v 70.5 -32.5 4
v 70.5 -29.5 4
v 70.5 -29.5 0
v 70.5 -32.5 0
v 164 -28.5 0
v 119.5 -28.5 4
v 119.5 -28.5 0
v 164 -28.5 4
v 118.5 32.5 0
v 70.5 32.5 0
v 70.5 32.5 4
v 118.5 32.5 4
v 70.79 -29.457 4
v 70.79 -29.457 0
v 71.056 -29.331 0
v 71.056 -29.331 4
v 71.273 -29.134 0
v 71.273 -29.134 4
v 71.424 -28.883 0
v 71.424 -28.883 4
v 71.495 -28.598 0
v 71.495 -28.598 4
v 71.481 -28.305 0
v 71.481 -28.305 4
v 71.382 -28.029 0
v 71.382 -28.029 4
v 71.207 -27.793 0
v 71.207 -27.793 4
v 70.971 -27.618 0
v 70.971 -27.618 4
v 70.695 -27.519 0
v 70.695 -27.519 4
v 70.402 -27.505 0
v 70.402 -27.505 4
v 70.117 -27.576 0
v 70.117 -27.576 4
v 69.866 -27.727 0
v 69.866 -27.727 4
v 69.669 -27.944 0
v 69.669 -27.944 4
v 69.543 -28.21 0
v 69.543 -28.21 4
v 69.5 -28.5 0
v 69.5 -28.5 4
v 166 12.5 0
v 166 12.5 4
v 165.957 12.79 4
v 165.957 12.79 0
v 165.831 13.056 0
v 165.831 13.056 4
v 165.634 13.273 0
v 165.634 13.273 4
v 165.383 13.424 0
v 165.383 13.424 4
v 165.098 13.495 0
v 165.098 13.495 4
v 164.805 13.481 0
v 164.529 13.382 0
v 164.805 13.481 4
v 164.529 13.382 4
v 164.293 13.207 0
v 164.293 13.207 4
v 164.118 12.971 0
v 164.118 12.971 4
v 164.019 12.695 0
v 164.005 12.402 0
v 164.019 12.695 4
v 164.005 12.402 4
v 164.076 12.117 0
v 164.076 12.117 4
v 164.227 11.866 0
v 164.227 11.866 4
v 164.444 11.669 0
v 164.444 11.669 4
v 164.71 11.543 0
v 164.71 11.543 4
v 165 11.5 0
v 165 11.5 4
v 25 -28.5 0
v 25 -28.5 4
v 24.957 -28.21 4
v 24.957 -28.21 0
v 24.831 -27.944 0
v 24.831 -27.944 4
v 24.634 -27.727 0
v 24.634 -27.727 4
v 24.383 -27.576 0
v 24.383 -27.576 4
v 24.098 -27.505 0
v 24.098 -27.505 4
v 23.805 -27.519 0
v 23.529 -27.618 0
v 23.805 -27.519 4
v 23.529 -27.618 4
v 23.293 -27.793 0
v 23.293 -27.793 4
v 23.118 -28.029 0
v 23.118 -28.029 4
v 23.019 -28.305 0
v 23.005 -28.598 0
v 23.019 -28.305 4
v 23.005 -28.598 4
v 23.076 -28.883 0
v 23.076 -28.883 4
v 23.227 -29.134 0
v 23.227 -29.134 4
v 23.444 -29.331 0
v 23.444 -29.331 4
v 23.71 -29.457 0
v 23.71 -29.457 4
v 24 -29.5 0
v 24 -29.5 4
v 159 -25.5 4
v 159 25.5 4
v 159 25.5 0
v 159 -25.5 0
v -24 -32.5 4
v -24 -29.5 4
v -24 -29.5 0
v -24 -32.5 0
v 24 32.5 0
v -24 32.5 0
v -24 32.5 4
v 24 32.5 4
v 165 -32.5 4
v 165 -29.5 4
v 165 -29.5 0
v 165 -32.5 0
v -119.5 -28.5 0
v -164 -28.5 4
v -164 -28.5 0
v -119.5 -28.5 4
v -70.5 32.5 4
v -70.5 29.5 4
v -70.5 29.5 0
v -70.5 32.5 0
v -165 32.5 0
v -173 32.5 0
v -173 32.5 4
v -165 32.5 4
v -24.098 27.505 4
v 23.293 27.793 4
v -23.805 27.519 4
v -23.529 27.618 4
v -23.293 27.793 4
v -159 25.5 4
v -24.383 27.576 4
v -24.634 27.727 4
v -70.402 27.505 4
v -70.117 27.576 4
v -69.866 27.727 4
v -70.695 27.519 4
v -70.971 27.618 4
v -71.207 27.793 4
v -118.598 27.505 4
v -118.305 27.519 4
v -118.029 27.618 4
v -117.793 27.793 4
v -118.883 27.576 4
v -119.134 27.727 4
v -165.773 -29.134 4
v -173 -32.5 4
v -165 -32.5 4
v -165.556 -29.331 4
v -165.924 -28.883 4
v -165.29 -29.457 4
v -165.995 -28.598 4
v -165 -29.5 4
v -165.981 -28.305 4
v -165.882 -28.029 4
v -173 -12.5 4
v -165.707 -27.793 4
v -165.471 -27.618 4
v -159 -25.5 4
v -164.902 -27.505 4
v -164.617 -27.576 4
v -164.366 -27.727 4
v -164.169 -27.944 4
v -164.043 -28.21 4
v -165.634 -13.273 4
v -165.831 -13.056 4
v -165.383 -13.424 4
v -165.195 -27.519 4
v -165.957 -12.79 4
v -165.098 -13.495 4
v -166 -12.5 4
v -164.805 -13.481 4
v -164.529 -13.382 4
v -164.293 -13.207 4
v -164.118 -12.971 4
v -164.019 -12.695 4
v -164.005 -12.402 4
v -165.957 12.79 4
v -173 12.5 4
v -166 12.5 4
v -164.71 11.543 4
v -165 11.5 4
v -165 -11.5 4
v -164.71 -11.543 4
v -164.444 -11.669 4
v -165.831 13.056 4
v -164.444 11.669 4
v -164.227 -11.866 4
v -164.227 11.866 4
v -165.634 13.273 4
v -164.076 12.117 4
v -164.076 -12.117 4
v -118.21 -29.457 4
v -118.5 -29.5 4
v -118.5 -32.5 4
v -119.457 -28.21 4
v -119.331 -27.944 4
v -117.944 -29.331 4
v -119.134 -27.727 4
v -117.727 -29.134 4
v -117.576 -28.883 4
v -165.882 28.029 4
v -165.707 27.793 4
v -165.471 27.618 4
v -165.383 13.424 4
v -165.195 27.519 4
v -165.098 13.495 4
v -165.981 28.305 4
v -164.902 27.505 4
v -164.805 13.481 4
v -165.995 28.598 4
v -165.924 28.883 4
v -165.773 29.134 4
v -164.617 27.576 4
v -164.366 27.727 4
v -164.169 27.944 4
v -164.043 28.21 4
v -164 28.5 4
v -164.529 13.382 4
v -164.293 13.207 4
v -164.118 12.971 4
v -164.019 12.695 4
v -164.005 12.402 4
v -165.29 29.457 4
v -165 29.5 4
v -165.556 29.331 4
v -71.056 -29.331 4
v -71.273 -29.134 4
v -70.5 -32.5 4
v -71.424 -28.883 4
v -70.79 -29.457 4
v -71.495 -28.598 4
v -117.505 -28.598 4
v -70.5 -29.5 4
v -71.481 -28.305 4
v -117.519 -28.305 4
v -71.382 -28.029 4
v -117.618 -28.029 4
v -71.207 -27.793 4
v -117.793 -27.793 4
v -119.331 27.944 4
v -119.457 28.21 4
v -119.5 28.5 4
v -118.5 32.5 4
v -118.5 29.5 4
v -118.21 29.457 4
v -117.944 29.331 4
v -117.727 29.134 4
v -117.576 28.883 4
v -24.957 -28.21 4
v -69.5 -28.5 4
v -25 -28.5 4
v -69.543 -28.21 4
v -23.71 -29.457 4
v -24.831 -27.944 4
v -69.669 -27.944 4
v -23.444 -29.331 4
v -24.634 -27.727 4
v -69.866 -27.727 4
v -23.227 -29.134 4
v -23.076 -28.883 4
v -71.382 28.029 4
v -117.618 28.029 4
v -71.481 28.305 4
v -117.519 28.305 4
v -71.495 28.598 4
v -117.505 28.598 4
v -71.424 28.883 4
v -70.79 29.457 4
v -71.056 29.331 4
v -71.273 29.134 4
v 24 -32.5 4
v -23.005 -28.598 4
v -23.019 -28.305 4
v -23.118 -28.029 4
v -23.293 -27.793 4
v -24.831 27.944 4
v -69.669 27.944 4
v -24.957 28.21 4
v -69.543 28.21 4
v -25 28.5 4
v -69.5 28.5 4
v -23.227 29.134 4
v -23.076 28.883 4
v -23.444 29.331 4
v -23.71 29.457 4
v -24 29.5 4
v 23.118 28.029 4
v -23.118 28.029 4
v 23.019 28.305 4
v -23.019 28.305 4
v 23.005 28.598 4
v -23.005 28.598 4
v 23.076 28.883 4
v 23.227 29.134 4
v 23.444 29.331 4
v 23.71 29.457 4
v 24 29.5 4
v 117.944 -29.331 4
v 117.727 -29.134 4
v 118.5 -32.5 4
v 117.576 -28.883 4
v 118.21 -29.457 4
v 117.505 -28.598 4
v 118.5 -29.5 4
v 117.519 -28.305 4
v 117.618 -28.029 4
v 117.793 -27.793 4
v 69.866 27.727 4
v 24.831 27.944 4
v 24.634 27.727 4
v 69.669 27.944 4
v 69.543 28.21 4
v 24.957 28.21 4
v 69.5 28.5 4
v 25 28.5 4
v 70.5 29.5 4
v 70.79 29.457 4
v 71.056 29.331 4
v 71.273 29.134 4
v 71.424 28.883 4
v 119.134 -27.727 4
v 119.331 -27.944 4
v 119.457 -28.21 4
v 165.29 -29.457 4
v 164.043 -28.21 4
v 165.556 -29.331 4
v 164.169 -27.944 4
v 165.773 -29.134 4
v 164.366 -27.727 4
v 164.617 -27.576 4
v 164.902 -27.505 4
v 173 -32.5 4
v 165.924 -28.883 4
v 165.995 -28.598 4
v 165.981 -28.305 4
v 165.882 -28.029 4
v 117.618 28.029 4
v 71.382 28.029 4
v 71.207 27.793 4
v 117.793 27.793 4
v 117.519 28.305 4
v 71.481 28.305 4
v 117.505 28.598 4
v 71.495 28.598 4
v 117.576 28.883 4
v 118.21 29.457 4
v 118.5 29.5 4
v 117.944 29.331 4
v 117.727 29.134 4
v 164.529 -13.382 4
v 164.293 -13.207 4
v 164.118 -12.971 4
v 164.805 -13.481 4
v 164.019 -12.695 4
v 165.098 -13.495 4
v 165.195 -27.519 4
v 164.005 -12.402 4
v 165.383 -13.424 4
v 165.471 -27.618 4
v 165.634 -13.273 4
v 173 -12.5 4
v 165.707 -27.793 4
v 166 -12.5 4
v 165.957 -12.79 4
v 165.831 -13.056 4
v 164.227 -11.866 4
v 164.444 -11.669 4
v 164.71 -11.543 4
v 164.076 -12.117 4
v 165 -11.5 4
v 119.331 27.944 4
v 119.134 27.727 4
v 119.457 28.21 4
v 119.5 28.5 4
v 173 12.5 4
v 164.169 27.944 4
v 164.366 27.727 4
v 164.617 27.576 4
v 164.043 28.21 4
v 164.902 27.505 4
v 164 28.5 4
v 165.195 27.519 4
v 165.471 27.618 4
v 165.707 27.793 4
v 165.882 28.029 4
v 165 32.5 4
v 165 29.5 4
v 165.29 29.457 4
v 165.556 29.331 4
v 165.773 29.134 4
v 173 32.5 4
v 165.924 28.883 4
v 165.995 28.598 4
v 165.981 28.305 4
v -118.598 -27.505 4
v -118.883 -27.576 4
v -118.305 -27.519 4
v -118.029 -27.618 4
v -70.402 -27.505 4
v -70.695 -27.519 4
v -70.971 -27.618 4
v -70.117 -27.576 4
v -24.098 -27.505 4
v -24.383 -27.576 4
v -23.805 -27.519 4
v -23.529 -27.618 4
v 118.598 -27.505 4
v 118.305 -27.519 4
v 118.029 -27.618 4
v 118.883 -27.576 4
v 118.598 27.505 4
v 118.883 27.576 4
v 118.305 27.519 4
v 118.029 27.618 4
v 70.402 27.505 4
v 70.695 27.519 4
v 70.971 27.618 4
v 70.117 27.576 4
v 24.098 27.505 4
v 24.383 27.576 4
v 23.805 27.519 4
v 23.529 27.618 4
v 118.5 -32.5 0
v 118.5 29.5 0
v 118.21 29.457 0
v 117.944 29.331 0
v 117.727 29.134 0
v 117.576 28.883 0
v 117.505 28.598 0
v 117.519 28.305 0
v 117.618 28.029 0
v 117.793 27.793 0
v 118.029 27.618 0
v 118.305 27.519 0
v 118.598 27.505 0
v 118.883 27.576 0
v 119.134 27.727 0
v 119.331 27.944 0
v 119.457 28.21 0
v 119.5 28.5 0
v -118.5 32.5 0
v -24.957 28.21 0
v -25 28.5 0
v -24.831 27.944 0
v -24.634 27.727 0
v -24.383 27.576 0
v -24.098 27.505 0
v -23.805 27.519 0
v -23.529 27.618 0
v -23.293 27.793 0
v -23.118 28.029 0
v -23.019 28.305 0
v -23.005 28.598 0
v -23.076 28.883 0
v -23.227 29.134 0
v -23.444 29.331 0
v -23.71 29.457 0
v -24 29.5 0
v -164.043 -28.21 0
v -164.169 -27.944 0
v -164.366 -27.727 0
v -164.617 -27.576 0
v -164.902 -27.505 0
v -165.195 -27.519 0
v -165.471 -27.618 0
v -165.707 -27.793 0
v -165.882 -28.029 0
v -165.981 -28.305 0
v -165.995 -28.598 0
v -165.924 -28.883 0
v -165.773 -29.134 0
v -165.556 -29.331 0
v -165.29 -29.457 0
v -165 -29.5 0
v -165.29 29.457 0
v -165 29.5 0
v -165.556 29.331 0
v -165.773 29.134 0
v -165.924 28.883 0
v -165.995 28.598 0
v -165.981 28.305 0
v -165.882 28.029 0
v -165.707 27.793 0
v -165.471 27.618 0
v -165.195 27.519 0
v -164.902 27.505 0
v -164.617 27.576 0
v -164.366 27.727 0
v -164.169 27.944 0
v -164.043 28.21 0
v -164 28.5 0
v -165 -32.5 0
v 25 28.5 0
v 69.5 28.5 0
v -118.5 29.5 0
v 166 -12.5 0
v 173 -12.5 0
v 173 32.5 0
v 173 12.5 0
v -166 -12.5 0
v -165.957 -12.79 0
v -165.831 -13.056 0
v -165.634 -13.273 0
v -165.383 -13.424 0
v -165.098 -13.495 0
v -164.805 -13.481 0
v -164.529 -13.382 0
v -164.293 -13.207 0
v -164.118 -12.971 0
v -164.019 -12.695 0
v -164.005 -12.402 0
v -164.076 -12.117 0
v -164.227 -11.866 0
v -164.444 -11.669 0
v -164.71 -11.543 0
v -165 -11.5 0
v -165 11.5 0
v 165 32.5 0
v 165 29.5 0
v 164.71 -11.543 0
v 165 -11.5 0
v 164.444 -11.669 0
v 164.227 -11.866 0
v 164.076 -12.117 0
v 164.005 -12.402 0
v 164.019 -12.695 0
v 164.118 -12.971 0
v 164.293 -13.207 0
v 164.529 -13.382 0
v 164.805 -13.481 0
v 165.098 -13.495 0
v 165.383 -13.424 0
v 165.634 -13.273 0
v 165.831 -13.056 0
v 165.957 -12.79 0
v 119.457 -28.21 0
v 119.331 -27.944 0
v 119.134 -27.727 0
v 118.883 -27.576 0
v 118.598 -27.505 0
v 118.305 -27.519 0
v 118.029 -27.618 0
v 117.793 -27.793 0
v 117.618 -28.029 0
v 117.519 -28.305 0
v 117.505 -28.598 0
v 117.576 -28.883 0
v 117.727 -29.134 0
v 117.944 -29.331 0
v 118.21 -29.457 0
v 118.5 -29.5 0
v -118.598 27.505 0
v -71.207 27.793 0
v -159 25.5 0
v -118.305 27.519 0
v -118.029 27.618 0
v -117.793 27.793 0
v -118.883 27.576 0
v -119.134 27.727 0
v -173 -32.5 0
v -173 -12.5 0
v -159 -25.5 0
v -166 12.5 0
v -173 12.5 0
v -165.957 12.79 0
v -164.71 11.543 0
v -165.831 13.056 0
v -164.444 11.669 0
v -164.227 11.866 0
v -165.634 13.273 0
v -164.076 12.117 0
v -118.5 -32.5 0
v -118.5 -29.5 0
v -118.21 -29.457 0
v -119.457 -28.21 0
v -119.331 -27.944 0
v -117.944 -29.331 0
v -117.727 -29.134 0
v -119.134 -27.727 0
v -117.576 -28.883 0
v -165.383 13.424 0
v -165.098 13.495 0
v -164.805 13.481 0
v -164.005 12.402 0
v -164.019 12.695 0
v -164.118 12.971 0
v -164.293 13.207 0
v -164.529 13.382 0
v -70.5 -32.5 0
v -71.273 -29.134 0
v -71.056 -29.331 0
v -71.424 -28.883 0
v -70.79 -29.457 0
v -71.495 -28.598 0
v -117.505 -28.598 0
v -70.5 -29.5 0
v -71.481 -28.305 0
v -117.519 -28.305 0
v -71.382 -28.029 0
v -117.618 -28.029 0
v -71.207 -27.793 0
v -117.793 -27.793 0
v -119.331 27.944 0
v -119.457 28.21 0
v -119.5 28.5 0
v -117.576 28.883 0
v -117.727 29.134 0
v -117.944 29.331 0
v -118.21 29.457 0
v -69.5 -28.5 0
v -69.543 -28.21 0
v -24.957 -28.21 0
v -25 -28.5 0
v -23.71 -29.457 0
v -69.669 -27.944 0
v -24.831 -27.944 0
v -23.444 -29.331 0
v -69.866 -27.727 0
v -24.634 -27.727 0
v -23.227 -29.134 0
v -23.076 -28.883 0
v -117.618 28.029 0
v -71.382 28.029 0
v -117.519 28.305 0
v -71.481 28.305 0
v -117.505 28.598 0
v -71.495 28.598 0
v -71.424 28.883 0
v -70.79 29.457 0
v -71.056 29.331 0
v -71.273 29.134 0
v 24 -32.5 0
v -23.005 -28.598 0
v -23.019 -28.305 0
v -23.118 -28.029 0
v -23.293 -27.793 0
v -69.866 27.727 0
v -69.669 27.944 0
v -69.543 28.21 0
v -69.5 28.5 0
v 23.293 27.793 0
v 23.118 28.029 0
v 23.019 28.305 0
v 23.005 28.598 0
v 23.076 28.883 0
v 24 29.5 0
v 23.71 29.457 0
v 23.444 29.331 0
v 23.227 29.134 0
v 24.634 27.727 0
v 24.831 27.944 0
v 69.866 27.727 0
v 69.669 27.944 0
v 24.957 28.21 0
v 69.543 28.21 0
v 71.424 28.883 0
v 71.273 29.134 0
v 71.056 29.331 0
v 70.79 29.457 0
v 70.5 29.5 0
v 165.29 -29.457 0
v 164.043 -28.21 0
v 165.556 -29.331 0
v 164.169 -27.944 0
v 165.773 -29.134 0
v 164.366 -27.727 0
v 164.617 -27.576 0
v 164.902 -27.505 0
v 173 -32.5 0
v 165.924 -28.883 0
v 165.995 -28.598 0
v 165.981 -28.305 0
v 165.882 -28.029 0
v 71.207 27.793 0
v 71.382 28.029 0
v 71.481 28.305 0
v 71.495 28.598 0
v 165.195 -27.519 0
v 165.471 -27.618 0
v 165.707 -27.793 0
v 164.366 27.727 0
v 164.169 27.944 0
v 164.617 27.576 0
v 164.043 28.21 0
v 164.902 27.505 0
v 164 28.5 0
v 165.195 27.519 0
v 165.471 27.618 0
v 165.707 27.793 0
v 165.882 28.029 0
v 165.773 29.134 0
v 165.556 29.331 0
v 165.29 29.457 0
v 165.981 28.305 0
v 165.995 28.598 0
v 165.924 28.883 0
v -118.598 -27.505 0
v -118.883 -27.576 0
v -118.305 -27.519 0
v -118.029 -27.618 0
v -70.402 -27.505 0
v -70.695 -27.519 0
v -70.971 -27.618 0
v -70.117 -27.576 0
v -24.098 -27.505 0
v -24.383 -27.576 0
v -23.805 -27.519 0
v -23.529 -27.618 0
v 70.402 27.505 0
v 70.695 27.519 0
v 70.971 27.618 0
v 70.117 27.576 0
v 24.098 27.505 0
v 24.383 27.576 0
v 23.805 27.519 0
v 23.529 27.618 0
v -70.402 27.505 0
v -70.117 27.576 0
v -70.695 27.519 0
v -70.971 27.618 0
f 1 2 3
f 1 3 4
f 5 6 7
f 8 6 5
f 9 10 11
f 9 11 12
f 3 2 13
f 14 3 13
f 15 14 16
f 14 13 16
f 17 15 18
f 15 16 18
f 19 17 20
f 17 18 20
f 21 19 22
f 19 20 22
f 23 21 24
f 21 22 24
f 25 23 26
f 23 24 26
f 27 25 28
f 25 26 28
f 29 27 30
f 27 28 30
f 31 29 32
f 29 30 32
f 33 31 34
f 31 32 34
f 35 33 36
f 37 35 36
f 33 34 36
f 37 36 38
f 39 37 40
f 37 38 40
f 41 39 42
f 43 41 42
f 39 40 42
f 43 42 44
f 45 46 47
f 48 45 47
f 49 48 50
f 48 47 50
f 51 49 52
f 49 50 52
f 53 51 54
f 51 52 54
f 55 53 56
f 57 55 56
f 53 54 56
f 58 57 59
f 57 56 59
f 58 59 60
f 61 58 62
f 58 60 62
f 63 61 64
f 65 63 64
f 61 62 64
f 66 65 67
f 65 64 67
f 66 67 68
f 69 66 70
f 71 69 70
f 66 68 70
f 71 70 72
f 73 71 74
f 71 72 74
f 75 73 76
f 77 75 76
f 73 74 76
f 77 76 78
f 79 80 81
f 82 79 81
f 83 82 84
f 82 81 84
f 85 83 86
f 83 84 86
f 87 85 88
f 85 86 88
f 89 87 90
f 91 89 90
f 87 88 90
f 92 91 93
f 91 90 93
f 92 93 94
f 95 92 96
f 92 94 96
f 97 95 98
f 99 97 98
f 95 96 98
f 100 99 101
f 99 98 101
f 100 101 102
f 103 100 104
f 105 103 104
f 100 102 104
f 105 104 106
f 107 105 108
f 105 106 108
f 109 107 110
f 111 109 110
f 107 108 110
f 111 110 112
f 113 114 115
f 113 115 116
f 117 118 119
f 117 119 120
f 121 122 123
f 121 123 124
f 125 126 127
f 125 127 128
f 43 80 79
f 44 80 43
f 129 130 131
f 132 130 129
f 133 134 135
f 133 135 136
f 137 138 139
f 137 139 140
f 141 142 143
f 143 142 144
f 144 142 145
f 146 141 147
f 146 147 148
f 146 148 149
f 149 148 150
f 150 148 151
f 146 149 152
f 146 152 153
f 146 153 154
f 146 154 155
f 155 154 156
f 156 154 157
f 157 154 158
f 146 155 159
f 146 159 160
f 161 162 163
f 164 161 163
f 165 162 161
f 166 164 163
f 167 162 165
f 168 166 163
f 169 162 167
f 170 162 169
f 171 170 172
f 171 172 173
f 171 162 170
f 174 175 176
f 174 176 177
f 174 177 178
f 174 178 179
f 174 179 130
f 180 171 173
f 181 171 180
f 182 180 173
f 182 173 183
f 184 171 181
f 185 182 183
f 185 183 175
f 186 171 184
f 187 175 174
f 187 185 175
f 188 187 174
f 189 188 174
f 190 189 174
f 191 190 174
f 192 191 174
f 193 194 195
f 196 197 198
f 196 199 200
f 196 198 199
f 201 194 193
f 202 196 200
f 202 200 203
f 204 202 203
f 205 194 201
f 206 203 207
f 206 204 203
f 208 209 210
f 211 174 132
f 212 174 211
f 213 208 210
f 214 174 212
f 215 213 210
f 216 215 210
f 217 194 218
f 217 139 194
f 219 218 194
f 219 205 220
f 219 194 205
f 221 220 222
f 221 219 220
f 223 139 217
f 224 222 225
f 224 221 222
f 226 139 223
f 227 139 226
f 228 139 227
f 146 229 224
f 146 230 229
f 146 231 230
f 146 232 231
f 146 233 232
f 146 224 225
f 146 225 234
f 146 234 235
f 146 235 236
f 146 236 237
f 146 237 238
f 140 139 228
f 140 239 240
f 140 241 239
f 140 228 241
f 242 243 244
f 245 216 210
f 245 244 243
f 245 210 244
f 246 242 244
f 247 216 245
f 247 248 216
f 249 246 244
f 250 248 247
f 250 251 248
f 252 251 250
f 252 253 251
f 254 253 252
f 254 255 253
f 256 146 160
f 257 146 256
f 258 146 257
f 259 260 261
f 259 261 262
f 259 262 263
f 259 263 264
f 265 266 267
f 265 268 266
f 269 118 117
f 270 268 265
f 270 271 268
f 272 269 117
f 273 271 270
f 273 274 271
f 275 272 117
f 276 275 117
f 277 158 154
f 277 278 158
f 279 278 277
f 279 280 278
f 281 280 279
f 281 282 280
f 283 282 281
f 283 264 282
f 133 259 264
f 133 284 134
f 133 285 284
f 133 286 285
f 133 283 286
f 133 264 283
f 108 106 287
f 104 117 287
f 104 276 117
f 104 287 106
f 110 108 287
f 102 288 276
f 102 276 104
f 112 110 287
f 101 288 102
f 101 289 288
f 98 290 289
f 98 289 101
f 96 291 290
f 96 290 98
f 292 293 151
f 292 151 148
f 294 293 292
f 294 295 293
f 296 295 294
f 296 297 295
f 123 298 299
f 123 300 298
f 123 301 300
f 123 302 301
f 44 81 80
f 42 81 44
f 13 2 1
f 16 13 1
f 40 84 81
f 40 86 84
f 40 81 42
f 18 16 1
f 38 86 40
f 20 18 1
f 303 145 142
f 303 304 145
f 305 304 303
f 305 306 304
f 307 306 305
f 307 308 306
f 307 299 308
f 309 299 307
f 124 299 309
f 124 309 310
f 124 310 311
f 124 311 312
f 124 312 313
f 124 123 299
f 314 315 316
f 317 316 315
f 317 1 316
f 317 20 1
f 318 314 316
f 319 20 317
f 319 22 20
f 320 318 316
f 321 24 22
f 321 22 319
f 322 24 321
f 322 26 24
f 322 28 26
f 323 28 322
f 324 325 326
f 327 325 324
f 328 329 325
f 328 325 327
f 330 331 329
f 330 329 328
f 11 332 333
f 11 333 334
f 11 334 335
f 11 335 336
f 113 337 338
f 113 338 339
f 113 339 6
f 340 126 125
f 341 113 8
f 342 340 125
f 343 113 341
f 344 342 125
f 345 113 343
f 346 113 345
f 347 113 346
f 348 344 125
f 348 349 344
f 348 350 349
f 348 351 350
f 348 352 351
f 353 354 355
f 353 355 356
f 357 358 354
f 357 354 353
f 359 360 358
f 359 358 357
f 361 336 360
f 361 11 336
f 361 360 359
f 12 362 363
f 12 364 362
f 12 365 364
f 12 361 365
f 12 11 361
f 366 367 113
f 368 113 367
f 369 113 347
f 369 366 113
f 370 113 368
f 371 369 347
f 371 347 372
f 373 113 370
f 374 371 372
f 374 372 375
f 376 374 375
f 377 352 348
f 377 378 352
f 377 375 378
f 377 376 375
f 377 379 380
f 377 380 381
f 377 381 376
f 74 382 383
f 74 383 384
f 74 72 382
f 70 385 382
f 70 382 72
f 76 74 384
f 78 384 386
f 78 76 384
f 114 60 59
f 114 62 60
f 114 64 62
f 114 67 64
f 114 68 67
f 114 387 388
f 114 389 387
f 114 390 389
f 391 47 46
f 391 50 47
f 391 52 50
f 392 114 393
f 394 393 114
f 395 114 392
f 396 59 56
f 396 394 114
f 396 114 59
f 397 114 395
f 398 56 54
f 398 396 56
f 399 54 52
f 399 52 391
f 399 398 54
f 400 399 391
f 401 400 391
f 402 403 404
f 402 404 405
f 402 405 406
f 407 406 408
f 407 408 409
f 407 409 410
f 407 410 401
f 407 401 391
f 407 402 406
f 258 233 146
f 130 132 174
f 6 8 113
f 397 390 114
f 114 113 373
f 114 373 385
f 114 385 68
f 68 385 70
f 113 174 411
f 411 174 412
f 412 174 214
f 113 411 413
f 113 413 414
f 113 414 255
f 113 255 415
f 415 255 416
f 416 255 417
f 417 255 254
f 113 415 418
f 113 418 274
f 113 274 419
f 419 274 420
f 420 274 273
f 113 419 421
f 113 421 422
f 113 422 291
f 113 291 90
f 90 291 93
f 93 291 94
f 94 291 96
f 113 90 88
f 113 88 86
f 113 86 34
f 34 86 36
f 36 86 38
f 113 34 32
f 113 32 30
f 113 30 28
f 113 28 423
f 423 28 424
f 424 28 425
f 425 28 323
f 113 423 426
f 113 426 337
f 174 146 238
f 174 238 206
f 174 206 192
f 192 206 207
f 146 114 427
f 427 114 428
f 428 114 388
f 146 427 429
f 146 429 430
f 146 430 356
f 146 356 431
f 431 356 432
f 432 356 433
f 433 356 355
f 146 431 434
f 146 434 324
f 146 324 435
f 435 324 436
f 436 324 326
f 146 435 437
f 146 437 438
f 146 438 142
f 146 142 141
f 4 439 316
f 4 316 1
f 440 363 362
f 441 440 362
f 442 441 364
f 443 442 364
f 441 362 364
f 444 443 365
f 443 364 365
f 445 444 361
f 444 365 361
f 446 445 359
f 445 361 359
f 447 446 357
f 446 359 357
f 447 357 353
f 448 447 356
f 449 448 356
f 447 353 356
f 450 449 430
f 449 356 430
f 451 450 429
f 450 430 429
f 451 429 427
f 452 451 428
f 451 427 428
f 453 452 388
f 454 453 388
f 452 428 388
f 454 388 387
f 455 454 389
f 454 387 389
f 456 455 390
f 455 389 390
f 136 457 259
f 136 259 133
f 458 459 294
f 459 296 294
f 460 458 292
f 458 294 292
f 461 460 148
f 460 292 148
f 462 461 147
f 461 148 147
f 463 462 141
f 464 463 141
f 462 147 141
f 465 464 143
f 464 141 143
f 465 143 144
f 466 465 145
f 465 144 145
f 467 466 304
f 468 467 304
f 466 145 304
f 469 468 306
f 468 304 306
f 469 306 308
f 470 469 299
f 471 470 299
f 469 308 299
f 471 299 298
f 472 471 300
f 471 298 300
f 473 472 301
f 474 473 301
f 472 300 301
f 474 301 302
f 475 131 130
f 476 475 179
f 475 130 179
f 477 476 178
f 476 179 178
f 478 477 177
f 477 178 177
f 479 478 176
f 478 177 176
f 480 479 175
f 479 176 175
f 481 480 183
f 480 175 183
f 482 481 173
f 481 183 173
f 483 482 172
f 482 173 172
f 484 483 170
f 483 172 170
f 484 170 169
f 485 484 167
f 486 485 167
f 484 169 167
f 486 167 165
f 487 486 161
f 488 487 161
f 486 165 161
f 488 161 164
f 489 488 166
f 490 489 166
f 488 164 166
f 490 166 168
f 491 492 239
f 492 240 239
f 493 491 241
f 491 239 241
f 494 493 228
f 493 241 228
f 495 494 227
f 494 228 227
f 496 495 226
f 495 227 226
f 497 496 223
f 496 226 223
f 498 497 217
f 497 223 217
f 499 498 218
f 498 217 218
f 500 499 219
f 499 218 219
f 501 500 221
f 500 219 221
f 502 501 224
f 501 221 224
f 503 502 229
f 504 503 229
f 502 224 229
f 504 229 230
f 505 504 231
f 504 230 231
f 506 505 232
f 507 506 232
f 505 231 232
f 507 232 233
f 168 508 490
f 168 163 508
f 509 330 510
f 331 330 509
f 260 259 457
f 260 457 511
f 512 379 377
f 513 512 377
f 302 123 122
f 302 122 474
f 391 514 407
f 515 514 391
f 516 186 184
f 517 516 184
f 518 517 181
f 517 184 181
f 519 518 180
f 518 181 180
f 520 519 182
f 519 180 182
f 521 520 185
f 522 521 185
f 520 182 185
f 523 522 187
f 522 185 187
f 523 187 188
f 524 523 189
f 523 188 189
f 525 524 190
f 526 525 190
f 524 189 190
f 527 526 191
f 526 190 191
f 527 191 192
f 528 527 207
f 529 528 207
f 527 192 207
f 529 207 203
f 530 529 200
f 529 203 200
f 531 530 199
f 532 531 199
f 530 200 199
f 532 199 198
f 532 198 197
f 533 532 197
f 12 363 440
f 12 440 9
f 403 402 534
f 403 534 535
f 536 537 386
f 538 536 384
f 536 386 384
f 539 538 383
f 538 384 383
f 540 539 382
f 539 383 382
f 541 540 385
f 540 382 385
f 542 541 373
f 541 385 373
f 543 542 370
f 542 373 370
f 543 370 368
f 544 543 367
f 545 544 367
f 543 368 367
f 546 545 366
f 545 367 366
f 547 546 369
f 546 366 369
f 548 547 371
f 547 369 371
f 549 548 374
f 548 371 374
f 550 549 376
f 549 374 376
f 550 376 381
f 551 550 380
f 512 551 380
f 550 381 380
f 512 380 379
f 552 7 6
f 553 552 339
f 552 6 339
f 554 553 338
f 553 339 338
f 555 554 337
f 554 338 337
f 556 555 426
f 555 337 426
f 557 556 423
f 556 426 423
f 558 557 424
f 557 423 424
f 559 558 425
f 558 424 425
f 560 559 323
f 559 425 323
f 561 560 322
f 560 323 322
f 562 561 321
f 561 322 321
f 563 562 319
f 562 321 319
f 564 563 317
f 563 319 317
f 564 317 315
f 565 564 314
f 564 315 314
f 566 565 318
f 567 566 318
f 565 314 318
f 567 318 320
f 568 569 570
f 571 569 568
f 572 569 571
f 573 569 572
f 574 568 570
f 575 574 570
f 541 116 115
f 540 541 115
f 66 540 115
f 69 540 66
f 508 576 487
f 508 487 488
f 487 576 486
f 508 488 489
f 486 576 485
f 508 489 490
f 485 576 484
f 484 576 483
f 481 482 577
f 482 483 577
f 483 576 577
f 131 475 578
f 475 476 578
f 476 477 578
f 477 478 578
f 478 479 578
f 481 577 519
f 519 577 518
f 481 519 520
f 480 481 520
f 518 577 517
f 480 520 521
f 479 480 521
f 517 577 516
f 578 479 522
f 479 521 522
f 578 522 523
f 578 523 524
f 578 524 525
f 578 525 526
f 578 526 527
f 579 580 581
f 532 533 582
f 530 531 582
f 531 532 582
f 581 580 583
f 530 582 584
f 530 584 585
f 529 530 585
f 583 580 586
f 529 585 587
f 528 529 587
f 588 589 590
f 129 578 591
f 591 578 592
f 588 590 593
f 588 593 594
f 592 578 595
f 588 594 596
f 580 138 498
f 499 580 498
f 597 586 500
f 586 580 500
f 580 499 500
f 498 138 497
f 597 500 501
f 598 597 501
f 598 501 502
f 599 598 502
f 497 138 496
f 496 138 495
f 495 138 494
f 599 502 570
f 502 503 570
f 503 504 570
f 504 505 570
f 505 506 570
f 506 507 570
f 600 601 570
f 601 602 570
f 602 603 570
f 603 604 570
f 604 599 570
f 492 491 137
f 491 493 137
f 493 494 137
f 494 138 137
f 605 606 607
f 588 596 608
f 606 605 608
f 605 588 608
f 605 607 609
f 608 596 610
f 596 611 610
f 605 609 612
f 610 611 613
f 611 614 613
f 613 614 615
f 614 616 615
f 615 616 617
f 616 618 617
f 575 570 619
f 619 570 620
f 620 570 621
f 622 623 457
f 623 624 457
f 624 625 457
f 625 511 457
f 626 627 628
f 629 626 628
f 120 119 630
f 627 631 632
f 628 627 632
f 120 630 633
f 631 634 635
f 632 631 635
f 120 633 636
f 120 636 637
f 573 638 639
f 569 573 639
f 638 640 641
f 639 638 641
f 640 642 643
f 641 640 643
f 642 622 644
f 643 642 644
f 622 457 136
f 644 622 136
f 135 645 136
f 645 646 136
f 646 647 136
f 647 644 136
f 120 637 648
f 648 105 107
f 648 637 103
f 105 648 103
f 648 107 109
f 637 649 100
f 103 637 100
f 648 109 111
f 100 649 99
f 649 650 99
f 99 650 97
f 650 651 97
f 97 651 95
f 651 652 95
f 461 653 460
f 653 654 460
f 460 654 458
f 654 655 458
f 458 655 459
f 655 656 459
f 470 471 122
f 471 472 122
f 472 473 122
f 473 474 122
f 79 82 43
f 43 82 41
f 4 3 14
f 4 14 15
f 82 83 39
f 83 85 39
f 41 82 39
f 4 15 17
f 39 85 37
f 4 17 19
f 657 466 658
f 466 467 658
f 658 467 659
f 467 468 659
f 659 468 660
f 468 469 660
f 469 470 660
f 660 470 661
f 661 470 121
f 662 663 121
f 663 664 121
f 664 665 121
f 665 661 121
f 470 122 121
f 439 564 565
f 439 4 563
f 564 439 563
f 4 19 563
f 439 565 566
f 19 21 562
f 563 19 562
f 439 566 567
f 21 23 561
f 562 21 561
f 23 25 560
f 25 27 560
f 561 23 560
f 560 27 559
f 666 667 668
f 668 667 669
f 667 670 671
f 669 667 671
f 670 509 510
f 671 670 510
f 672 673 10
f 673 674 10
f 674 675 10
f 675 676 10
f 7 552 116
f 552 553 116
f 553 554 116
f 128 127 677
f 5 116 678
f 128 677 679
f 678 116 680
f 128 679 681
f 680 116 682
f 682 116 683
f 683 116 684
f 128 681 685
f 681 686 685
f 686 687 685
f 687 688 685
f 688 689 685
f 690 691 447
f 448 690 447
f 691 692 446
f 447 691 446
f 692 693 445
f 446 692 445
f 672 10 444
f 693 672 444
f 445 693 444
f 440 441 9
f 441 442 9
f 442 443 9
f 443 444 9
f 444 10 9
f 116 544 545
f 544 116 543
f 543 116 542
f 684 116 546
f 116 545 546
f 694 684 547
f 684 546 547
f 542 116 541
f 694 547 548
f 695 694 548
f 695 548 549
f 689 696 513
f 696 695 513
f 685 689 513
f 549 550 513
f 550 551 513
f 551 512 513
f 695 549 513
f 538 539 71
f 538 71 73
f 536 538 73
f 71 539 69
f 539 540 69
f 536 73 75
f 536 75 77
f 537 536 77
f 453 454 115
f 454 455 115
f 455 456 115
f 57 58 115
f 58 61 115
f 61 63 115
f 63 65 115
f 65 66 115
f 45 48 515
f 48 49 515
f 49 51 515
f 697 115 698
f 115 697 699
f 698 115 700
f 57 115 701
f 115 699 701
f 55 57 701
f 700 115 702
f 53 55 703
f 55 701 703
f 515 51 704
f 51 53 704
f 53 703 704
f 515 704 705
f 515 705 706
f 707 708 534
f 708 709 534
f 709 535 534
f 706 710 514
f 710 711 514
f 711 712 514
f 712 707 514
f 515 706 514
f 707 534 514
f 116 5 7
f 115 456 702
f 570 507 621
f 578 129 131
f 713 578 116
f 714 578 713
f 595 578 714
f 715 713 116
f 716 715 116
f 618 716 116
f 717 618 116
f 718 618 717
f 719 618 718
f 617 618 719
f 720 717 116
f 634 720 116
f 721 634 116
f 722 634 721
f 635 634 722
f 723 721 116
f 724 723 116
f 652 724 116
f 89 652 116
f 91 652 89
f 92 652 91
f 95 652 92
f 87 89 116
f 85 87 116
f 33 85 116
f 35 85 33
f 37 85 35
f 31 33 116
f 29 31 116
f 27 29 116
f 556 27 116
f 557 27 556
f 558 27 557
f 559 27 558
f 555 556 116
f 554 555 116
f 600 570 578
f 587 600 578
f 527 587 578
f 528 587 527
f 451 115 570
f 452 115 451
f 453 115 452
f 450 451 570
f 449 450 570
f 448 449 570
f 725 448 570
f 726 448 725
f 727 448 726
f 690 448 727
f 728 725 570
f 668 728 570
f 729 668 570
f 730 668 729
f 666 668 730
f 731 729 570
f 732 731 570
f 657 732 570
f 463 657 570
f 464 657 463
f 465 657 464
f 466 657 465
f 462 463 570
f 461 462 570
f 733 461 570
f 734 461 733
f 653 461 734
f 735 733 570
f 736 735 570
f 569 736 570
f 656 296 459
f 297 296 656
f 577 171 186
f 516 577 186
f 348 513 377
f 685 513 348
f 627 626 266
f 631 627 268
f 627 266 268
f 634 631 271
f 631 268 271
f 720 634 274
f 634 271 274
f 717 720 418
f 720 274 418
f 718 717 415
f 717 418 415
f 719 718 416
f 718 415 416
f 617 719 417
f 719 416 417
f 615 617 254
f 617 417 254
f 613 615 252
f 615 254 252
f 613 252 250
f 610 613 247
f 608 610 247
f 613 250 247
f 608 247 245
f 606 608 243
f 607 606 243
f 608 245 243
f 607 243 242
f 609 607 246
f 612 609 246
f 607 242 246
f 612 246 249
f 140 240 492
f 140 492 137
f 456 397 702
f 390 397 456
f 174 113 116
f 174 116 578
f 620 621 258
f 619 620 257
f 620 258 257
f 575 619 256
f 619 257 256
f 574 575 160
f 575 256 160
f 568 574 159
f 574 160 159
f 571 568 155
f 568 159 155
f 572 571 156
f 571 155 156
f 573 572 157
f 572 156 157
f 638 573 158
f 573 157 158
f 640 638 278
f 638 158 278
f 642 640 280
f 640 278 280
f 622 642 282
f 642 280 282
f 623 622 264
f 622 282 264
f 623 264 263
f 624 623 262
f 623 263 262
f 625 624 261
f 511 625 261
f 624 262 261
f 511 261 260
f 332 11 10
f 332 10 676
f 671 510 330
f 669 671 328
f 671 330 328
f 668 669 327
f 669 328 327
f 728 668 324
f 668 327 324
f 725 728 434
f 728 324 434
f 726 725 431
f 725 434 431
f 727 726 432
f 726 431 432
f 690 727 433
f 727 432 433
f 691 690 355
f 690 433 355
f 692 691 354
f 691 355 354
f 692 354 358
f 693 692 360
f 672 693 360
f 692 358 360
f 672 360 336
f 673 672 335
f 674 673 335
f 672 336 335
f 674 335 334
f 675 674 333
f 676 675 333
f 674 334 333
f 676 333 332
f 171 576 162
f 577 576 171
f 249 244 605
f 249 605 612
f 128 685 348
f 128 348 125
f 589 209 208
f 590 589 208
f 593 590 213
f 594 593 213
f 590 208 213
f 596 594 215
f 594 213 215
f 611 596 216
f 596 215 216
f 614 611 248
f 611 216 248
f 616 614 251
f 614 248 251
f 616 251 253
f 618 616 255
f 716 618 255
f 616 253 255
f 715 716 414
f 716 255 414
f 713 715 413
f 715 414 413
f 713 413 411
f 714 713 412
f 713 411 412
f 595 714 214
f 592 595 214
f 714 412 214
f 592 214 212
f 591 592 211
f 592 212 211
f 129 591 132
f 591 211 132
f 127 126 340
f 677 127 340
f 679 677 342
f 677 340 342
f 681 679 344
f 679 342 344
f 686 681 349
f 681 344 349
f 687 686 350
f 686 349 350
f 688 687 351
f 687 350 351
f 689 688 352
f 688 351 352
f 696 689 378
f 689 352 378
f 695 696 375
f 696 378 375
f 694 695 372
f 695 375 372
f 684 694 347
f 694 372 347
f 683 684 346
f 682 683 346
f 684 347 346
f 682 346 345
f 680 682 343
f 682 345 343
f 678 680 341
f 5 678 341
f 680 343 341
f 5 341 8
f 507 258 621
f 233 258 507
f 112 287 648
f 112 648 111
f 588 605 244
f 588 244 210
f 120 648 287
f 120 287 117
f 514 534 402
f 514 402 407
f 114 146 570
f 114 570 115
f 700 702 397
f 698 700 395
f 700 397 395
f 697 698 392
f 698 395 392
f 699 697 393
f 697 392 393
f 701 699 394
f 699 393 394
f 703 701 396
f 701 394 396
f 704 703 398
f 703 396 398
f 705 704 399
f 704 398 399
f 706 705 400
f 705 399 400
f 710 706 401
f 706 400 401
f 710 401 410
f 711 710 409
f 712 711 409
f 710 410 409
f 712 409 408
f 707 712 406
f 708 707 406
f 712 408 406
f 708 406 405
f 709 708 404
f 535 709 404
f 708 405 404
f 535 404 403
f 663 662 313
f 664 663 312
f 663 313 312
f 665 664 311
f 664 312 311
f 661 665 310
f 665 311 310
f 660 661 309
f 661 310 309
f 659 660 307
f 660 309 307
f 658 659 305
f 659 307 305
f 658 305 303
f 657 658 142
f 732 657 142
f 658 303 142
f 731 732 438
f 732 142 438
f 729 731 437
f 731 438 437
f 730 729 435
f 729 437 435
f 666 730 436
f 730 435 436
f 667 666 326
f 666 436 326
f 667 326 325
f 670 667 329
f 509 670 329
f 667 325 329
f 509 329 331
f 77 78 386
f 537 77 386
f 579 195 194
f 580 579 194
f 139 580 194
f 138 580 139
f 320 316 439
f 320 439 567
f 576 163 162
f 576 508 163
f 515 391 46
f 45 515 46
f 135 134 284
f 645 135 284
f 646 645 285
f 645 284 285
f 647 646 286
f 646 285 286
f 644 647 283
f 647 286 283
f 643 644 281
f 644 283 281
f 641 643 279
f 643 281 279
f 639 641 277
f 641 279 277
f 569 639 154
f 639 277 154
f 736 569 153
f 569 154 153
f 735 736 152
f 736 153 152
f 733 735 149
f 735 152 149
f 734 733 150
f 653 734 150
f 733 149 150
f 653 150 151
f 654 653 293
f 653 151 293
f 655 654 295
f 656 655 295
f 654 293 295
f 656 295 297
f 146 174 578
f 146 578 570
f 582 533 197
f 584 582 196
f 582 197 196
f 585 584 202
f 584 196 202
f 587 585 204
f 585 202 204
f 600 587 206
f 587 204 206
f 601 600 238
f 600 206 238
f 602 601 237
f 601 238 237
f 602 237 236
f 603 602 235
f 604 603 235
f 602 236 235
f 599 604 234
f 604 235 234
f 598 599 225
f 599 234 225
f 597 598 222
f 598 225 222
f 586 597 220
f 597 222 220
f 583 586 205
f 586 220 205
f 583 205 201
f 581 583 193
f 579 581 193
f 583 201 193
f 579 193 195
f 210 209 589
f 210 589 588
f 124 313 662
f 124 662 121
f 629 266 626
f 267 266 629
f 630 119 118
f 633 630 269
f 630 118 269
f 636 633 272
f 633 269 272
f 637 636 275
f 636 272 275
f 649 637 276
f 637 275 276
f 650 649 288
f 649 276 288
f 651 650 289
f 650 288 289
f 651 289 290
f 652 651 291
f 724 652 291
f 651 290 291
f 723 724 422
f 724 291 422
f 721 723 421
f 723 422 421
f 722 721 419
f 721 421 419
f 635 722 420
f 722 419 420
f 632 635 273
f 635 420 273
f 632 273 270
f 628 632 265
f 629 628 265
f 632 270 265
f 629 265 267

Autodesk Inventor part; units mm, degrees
ref_plane "YZ Plane" through (0, 0, 0) normal (1, 0, 0) x (0, 1, 0)
ref_plane "XZ Plane" through (0, 0, 0) normal (0, 1, 0) x (-1, 0, 0)
ref_plane "XY Plane" through (0, 0, 0) normal (0, 0, 1) x (1, 0, 0)
sketch "Sketch1" plane through (0, 0, 0) normal (0, 0, 1) x (1, 0, 0)
  line L0 (-173, 32.5) -> (173, 32.5)
  line L1 (173, 32.5) -> (173, -32.5)
  line L2 (173, -32.5) -> (-173, -32.5)
  line L3 (-173, -32.5) -> (-173, 32.5)
  point P0 (0, 0)
  point P1 (173, 0)
  point P2 (0, 32.5)
  dimension "d0" = 65
  dimension "d1" = 346
extrude "Extrusion1" add sketch "Sketch1" along normal blind 4
sketch "Sketch2" plane through (0, 0, 4) normal (0, 0, 1) x (1, 0, 0)
  line L0 (-159, 25.5) -> (159, 25.5)
  line L1 (159, 25.5) -> (159, -25.5)
  line L2 (159, -25.5) -> (-159, -25.5)
  line L3 (-159, -25.5) -> (-159, 25.5)
  line L4 (173, 32.5) -> (-173, 32.5) projected
  line L5 (-173, 32.5) -> (-173, -32.5) projected
  line L6 (-173, -32.5) -> (173, -32.5) projected
  line L7 (173, -32.5) -> (173, 32.5) projected
  point P0 (0, 0)
  dimension "d4" = 7
  dimension "d5" = 14
  dimension "d6" = 7
  dimension "d7" = 14
extrude "Extrusion2" cut sketch "Sketch2" against normal blind 10 contours L0 L1 L2 L3
sketch "Esboço3" plane through (0, 0, 4) normal (0, 0, 1) x (1, 0, 0)
  line L0 (-118.5, 32.5) -> (-118.5, 28.5)
  line L1 (-118.5, 28.5) -> (-165, 28.5)
  line L2 (-70.5, 32.5) -> (-24, 32.5)
  line L3 (-24, 32.5) -> (-24, 28.5)
  line L4 (-24, 28.5) -> (-70.5, 28.5)
  line L5 (-70.5, 28.5) -> (-70.5, 32.5)
  circle A0 centre (-118.5, 28.5) radius 1
  circle A1 centre (-70.5, 28.5) radius 1
  circle A2 centre (-24, 28.5) radius 1
  line L6 (-165, 28.5) -> (-165, 32.5)
  line L7 (-165, 32.5) -> (-118.5, 32.5)
  line L8 (173, 32.5) -> (-173, 32.5) projected
  line L9 (-173, 32.5) -> (-173, -32.5) projected
  circle A3 centre (-165, 28.5) radius 1
  point P0 (0, 0)
  dimension "d12" = 46.5
  dimension "d13" = 48
  dimension "d14" = 2
  dimension "d15" = 2
  dimension "d16" = 2
  dimension "d19" = 8
  dimension "d20" = 46.5
  dimension "d21" = 2
extrude "Extrusão3" cut sketch "Esboço3" against normal blind 10
mirror "Espelhamento1" about plane through (0, 0, 0) normal (1, 0, 0) of "Extrusão3"
mirror "Espelhamento2" about plane through (0, 0, 0) normal (0, 1, 0) of "Extrusão3", "Espelhamento1"
sketch "Esboço4" plane through (0, 0, 4) normal (0, 0, 1) x (1, 0, 0)
  line L0 (-173, 32.5) -> (-173, -32.5) projected
  line L1 (-173, -12.5) -> (-165, -12.5)
  line L2 (-165, -12.5) -> (-165, 12.5)
  line L3 (-165, 12.5) -> (-173, 12.5)
  line L4 (-173, 12.5) -> (-173, -12.5)
  line L5 (-165, 32.5) -> (-173, 32.5) projected
  line L6 (-173, -32.5) -> (-165, -32.5) projected
  circle A0 centre (-165, 12.5) radius 1
  circle A1 centre (-165, -12.5) radius 1
  point P0 (0, 0)
  dimension "d22" = 8
  dimension "d23" = 20
  dimension "d24" = 25
  dimension "d25" = 20
  dimension "d26" = 2
  dimension "d27" = 2
extrude "Extrusão4" cut sketch "Esboço4" against normal blind 10
mirror "Espelhamento3" about plane through (0, 0, 0) normal (1, 0, 0) of "Extrusão4"
properties part number "letreiro"
